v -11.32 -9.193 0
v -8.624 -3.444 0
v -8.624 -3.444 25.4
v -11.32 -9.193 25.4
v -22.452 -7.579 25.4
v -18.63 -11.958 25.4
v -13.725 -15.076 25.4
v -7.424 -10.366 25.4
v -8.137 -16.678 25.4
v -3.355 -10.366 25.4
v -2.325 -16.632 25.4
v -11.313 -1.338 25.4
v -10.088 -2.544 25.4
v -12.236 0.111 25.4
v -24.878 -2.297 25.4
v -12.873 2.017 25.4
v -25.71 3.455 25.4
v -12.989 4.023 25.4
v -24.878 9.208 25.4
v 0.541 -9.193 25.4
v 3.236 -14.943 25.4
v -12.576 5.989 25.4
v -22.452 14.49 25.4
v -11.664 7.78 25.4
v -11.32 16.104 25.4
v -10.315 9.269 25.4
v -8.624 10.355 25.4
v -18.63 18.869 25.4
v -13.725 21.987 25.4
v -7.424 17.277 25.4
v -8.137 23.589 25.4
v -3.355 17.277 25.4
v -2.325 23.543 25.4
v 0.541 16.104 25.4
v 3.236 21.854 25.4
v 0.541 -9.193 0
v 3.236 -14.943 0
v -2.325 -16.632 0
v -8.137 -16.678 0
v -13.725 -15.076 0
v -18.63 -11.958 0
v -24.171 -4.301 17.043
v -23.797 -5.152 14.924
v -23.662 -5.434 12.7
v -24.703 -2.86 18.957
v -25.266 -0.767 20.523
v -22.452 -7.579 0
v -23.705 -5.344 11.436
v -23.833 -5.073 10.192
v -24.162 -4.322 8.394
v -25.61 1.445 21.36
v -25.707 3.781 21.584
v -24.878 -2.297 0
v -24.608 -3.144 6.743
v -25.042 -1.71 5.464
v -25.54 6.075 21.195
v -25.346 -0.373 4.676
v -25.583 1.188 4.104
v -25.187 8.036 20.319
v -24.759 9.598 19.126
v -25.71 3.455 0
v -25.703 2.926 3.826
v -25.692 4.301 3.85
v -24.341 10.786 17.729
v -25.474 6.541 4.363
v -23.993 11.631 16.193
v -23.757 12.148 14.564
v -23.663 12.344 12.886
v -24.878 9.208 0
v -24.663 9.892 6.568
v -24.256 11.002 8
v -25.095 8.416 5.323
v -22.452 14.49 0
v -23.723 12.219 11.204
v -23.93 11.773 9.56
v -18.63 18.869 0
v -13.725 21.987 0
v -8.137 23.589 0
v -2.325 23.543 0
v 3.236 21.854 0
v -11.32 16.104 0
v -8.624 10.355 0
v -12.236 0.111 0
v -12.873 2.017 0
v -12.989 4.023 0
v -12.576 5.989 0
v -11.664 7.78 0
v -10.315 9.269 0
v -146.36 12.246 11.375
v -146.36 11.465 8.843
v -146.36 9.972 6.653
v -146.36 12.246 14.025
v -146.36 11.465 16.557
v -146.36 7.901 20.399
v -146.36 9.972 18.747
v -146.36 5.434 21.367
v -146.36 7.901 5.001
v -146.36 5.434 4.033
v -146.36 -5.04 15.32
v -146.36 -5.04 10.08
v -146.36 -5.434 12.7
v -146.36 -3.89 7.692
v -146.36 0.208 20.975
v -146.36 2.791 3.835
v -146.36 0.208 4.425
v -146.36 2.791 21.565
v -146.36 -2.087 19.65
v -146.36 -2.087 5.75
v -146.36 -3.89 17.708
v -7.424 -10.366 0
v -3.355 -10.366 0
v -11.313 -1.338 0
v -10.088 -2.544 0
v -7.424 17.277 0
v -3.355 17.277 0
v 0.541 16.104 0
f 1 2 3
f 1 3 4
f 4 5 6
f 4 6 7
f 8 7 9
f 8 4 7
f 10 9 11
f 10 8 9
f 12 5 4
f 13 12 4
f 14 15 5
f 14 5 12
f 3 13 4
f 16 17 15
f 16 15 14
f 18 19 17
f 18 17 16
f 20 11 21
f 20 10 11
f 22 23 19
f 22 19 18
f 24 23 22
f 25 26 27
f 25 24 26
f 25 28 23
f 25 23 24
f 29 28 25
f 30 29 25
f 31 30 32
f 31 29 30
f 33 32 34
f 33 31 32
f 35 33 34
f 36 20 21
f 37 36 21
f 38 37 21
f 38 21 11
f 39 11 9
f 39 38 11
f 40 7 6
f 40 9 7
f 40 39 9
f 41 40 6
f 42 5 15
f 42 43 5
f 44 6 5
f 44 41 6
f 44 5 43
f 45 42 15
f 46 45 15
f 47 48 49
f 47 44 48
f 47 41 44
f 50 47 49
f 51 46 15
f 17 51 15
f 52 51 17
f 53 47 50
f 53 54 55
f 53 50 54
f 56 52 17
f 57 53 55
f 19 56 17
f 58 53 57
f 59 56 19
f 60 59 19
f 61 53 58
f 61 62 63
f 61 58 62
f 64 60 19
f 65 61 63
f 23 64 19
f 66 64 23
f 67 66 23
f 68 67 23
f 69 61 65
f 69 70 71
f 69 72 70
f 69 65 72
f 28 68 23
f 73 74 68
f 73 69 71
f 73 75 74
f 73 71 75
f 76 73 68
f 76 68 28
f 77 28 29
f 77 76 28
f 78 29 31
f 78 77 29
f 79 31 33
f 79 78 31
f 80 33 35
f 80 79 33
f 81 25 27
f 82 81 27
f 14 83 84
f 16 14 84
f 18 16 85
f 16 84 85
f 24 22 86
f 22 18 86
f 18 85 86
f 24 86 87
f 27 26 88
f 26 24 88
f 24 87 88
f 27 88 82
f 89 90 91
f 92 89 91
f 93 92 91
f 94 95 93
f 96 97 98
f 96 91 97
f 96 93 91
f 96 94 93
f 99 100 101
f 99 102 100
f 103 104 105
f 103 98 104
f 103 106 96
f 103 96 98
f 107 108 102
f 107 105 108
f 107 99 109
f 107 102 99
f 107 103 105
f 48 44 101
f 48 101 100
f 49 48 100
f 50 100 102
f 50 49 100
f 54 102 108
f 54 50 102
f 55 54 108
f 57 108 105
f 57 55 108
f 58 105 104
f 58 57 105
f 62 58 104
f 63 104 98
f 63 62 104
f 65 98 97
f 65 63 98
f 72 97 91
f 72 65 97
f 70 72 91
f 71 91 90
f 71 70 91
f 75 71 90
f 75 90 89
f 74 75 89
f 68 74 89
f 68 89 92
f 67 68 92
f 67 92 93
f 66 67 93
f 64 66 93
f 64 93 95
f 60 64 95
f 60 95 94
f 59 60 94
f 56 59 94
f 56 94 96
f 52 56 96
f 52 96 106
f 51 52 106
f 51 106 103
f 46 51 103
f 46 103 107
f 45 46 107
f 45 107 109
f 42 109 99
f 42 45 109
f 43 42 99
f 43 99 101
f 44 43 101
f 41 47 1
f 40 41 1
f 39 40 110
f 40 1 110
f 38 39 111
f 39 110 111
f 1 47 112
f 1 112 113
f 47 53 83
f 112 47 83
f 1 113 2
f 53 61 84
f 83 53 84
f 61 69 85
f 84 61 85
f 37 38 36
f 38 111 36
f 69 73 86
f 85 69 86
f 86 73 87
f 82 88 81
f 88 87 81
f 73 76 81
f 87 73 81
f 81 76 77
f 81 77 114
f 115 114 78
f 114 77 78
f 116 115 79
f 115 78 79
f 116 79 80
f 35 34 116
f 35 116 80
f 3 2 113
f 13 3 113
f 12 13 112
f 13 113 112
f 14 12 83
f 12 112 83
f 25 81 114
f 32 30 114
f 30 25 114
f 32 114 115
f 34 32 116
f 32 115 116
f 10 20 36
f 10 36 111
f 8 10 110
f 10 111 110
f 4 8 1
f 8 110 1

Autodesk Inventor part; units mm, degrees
ref_plane "YZ Plane" through (0, 0, 0) normal (1, 0, 0) x (0, 1, 0)
ref_plane "XZ Plane" through (0, 0, 0) normal (0, 1, 0) x (-1, 0, 0)
ref_plane "XY Plane" through (0, 0, 0) normal (0, 0, 1) x (1, 0, 0)
sketch "Sketch1" plane through (0, 0, 0) normal (0, 0, 1) x (1, 0, 0)
  arc A0 (0.5408, 16.1042) -> (0.5408, -9.1933) centre (-5.3897, 3.4555) ccw
  arc A1 (3.2365, 21.8536) -> (3.2365, -14.9427) centre (-5.3897, 3.4555) ccw
  arc A2 (-8.6245, 10.3548) -> (-12.2365, 0.111) centre (-5.3897, 3.4555) ccw
  line L0 (-11.3201, 16.1042) -> (-8.6245, 10.3548)
  line L1 (-5.3897, 3.4555) -> (3.2365, 21.8536) construction
  line L2 (-5.3897, 3.4555) -> (3.2365, -14.9427) construction
  line L3 (-5.3897, 3.4555) -> (14.9303, 3.4555) construction
  line L4 (-5.3897, 3.4555) -> (-14.0158, -14.9427) construction
  line L5 (-5.3897, 3.4555) -> (-14.0158, 21.8536) construction
  arc A3 (-8.6245, 10.3548) -> (-8.6245, -3.4438) centre (-5.3897, 3.4555) ccw
  line L6 (-8.6245, -3.4438) -> (-11.3201, -9.1933)
  line L7 (0.5408, 16.1042) -> (3.2365, 21.8536)
  line L8 (0.5408, -9.1933) -> (3.2365, -14.9427)
  line L9 (-19.3597, 3.4555) -> (-19.3597, -7.0739) construction
  point P0 (0, 0)
  dimension "d0" = 27.94
  dimension "d1" = 40.64
  dimension "d2" = 15.24
  dimension "d4" = 129.76
extrude "Extrusion1" add sketch "Sketch1" along normal blind 25.4
ref_plane "Work Plane1" through (-19.3597, 3.4555, 0) normal (-1, 0, 0) x (0, -1, 0)
sketch "Sketch2" plane through (-19.3597, 3.4555, 0) normal (-1, 0, 0) x (0, -1, 0)
  line L0 (-20.32, 0) -> (-20.32, 25.4) projected
  line L1 (20.32, 25.4) -> (-20.32, 25.4) projected
  line L2 (-20.32, 0) -> (20.32, 25.4)
  line L3 (-20.32, 25.4) -> (20.32, 0)
  line L4 (20.32, 0) -> (20.32, 25.4) projected
  circle A0 centre (0, 12.7) radius 8.89
  point P0 (3.4555, 0)
  point P1 (-18.3981, 25.4)
  point P2 (18.3981, 25.4)
  dimension "d7" = 17.78
extrude "Extrusion2" add sketch "Sketch2" along normal blind 127 contours A0 L3 L2 | L2 L3 A0 | A0 L2 L3 | L2 A0 L3
properties part number "golf2"
